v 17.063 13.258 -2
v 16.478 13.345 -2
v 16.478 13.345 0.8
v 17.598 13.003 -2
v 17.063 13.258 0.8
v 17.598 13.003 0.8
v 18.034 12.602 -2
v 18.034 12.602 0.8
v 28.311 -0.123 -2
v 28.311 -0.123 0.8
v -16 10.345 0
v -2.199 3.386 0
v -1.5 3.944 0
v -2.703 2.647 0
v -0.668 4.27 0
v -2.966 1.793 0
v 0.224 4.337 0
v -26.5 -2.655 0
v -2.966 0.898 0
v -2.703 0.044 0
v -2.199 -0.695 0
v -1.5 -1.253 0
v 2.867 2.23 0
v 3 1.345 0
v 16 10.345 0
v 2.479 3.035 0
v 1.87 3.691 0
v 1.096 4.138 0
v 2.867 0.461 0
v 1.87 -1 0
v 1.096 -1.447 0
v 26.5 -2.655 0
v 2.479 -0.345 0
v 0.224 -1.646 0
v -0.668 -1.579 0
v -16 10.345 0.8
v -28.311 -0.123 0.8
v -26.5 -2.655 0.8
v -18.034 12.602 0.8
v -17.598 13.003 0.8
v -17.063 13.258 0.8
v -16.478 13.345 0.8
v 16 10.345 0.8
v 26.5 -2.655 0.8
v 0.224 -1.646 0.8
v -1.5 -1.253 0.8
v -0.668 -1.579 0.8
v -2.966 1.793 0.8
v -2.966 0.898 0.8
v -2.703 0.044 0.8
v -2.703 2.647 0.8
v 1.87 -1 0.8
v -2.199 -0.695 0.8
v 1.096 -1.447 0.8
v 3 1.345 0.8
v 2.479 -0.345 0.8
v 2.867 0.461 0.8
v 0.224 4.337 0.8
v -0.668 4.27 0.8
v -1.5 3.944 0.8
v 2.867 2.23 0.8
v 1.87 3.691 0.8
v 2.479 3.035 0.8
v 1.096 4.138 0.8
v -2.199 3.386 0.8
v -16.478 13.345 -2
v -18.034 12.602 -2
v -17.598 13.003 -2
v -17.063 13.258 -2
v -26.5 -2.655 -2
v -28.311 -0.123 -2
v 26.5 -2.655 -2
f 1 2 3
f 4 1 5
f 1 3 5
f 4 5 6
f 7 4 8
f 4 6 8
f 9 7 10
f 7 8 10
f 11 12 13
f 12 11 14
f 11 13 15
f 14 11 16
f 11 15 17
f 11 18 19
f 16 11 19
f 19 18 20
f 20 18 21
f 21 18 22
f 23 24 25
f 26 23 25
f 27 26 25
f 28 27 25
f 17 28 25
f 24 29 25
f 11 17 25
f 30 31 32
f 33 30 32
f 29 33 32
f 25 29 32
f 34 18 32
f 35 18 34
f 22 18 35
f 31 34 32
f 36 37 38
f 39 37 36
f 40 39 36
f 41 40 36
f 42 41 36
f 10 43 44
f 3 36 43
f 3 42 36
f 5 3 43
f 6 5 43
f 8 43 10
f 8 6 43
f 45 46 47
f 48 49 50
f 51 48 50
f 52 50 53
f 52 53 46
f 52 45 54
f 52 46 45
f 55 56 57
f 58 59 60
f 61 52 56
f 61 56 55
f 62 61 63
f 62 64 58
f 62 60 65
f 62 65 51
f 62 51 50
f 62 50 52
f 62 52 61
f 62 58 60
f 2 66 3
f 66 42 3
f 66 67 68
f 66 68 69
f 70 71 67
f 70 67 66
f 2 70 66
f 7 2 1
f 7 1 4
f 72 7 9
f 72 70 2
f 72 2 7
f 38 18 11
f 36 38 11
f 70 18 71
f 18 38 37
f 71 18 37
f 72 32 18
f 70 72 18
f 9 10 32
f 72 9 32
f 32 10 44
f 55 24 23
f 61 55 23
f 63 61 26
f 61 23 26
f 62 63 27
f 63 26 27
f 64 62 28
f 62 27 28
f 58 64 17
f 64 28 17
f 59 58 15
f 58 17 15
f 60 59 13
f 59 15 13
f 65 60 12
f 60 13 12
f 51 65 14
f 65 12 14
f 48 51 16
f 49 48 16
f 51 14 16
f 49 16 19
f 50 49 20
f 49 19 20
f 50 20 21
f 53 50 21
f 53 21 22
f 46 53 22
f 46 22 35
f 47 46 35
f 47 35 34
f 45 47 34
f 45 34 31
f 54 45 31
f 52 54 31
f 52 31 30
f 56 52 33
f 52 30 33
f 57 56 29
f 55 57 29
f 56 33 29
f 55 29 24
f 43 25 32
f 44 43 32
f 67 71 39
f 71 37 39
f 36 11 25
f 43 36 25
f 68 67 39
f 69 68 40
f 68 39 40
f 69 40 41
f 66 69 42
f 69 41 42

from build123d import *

# Parameters (mm, degrees)
F0_R     = 3
F1_DEPTH = 0.8
F3_DEPTH = 2


with BuildPart() as f1:
    # F0 (on Top) → F1 (new body)
    with BuildSketch(Plane.XY):
        with BuildLine():
            Line((-2, 10.345446), (0, 10.345446))
            Line((0, 10.345446), (2, 10.345446))
            Line((2, 10.345446), (5.554248, 10.345446))
            Line((5.554248, 10.345446), (16, 10.345446))
            Line((16, 10.345446), (26.5, -2.654554))
            Line((26.5, -2.654554), (28.31125, -0.122547))
            Line((28.31125, -0.122547), (18.033634, 12.60212))
            ThreePointArc((18.033634, 12.60212), (17.339915, 13.150071), (16.477752, 13.345446))
            Line((16.477752, 13.345446), (0, 13.345446))
            Line((0, 13.345446), (-16.477752, 13.345446))
            ThreePointArc((-16.477752, 13.345446), (-17.339915, 13.150071), (-18.033634, 12.60212))
            Line((-18.033634, 12.60212), (-28.31125, -0.122547))
            Line((-28.31125, -0.122547), (-26.5, -2.654554))
            Line((-26.5, -2.654554), (-16, 10.345446))
            Line((-16, 10.345446), (-5.554248, 10.345446))
            Line((-5.554248, 10.345446), (-2, 10.345446))
        make_face()
        with Locations((0, 1.345446)):
            Circle(F0_R)
    extrude(amount=F1_DEPTH)

    # F2 (on face) → F3 (join)
    with BuildSketch(Plane(origin=(0, 0, 0), x_dir=(1, 0, 0), z_dir=(0, 0, -1))):
        with BuildLine():
            Line((-26.5, 2.654554), (-28.31125, 0.122547))
            Line((-28.31125, 0.122547), (-18.033634, -12.60212))
            ThreePointArc((-18.033634, -12.60212), (-17.339915, -13.150071), (-16.477752, -13.345446))
            Line((-16.477752, -13.345446), (16.477752, -13.345446))
            ThreePointArc((16.477752, -13.345446), (17.339915, -13.150071), (18.033634, -12.60212))
            Line((18.033634, -12.60212), (28.31125, 0.122547))
            Line((28.31125, 0.122547), (26.5, 2.654554))
            Line((26.5, 2.654554), (-26.5, 2.654554))
        make_face()
    extrude(amount=F3_DEPTH)


solid = f1.part
